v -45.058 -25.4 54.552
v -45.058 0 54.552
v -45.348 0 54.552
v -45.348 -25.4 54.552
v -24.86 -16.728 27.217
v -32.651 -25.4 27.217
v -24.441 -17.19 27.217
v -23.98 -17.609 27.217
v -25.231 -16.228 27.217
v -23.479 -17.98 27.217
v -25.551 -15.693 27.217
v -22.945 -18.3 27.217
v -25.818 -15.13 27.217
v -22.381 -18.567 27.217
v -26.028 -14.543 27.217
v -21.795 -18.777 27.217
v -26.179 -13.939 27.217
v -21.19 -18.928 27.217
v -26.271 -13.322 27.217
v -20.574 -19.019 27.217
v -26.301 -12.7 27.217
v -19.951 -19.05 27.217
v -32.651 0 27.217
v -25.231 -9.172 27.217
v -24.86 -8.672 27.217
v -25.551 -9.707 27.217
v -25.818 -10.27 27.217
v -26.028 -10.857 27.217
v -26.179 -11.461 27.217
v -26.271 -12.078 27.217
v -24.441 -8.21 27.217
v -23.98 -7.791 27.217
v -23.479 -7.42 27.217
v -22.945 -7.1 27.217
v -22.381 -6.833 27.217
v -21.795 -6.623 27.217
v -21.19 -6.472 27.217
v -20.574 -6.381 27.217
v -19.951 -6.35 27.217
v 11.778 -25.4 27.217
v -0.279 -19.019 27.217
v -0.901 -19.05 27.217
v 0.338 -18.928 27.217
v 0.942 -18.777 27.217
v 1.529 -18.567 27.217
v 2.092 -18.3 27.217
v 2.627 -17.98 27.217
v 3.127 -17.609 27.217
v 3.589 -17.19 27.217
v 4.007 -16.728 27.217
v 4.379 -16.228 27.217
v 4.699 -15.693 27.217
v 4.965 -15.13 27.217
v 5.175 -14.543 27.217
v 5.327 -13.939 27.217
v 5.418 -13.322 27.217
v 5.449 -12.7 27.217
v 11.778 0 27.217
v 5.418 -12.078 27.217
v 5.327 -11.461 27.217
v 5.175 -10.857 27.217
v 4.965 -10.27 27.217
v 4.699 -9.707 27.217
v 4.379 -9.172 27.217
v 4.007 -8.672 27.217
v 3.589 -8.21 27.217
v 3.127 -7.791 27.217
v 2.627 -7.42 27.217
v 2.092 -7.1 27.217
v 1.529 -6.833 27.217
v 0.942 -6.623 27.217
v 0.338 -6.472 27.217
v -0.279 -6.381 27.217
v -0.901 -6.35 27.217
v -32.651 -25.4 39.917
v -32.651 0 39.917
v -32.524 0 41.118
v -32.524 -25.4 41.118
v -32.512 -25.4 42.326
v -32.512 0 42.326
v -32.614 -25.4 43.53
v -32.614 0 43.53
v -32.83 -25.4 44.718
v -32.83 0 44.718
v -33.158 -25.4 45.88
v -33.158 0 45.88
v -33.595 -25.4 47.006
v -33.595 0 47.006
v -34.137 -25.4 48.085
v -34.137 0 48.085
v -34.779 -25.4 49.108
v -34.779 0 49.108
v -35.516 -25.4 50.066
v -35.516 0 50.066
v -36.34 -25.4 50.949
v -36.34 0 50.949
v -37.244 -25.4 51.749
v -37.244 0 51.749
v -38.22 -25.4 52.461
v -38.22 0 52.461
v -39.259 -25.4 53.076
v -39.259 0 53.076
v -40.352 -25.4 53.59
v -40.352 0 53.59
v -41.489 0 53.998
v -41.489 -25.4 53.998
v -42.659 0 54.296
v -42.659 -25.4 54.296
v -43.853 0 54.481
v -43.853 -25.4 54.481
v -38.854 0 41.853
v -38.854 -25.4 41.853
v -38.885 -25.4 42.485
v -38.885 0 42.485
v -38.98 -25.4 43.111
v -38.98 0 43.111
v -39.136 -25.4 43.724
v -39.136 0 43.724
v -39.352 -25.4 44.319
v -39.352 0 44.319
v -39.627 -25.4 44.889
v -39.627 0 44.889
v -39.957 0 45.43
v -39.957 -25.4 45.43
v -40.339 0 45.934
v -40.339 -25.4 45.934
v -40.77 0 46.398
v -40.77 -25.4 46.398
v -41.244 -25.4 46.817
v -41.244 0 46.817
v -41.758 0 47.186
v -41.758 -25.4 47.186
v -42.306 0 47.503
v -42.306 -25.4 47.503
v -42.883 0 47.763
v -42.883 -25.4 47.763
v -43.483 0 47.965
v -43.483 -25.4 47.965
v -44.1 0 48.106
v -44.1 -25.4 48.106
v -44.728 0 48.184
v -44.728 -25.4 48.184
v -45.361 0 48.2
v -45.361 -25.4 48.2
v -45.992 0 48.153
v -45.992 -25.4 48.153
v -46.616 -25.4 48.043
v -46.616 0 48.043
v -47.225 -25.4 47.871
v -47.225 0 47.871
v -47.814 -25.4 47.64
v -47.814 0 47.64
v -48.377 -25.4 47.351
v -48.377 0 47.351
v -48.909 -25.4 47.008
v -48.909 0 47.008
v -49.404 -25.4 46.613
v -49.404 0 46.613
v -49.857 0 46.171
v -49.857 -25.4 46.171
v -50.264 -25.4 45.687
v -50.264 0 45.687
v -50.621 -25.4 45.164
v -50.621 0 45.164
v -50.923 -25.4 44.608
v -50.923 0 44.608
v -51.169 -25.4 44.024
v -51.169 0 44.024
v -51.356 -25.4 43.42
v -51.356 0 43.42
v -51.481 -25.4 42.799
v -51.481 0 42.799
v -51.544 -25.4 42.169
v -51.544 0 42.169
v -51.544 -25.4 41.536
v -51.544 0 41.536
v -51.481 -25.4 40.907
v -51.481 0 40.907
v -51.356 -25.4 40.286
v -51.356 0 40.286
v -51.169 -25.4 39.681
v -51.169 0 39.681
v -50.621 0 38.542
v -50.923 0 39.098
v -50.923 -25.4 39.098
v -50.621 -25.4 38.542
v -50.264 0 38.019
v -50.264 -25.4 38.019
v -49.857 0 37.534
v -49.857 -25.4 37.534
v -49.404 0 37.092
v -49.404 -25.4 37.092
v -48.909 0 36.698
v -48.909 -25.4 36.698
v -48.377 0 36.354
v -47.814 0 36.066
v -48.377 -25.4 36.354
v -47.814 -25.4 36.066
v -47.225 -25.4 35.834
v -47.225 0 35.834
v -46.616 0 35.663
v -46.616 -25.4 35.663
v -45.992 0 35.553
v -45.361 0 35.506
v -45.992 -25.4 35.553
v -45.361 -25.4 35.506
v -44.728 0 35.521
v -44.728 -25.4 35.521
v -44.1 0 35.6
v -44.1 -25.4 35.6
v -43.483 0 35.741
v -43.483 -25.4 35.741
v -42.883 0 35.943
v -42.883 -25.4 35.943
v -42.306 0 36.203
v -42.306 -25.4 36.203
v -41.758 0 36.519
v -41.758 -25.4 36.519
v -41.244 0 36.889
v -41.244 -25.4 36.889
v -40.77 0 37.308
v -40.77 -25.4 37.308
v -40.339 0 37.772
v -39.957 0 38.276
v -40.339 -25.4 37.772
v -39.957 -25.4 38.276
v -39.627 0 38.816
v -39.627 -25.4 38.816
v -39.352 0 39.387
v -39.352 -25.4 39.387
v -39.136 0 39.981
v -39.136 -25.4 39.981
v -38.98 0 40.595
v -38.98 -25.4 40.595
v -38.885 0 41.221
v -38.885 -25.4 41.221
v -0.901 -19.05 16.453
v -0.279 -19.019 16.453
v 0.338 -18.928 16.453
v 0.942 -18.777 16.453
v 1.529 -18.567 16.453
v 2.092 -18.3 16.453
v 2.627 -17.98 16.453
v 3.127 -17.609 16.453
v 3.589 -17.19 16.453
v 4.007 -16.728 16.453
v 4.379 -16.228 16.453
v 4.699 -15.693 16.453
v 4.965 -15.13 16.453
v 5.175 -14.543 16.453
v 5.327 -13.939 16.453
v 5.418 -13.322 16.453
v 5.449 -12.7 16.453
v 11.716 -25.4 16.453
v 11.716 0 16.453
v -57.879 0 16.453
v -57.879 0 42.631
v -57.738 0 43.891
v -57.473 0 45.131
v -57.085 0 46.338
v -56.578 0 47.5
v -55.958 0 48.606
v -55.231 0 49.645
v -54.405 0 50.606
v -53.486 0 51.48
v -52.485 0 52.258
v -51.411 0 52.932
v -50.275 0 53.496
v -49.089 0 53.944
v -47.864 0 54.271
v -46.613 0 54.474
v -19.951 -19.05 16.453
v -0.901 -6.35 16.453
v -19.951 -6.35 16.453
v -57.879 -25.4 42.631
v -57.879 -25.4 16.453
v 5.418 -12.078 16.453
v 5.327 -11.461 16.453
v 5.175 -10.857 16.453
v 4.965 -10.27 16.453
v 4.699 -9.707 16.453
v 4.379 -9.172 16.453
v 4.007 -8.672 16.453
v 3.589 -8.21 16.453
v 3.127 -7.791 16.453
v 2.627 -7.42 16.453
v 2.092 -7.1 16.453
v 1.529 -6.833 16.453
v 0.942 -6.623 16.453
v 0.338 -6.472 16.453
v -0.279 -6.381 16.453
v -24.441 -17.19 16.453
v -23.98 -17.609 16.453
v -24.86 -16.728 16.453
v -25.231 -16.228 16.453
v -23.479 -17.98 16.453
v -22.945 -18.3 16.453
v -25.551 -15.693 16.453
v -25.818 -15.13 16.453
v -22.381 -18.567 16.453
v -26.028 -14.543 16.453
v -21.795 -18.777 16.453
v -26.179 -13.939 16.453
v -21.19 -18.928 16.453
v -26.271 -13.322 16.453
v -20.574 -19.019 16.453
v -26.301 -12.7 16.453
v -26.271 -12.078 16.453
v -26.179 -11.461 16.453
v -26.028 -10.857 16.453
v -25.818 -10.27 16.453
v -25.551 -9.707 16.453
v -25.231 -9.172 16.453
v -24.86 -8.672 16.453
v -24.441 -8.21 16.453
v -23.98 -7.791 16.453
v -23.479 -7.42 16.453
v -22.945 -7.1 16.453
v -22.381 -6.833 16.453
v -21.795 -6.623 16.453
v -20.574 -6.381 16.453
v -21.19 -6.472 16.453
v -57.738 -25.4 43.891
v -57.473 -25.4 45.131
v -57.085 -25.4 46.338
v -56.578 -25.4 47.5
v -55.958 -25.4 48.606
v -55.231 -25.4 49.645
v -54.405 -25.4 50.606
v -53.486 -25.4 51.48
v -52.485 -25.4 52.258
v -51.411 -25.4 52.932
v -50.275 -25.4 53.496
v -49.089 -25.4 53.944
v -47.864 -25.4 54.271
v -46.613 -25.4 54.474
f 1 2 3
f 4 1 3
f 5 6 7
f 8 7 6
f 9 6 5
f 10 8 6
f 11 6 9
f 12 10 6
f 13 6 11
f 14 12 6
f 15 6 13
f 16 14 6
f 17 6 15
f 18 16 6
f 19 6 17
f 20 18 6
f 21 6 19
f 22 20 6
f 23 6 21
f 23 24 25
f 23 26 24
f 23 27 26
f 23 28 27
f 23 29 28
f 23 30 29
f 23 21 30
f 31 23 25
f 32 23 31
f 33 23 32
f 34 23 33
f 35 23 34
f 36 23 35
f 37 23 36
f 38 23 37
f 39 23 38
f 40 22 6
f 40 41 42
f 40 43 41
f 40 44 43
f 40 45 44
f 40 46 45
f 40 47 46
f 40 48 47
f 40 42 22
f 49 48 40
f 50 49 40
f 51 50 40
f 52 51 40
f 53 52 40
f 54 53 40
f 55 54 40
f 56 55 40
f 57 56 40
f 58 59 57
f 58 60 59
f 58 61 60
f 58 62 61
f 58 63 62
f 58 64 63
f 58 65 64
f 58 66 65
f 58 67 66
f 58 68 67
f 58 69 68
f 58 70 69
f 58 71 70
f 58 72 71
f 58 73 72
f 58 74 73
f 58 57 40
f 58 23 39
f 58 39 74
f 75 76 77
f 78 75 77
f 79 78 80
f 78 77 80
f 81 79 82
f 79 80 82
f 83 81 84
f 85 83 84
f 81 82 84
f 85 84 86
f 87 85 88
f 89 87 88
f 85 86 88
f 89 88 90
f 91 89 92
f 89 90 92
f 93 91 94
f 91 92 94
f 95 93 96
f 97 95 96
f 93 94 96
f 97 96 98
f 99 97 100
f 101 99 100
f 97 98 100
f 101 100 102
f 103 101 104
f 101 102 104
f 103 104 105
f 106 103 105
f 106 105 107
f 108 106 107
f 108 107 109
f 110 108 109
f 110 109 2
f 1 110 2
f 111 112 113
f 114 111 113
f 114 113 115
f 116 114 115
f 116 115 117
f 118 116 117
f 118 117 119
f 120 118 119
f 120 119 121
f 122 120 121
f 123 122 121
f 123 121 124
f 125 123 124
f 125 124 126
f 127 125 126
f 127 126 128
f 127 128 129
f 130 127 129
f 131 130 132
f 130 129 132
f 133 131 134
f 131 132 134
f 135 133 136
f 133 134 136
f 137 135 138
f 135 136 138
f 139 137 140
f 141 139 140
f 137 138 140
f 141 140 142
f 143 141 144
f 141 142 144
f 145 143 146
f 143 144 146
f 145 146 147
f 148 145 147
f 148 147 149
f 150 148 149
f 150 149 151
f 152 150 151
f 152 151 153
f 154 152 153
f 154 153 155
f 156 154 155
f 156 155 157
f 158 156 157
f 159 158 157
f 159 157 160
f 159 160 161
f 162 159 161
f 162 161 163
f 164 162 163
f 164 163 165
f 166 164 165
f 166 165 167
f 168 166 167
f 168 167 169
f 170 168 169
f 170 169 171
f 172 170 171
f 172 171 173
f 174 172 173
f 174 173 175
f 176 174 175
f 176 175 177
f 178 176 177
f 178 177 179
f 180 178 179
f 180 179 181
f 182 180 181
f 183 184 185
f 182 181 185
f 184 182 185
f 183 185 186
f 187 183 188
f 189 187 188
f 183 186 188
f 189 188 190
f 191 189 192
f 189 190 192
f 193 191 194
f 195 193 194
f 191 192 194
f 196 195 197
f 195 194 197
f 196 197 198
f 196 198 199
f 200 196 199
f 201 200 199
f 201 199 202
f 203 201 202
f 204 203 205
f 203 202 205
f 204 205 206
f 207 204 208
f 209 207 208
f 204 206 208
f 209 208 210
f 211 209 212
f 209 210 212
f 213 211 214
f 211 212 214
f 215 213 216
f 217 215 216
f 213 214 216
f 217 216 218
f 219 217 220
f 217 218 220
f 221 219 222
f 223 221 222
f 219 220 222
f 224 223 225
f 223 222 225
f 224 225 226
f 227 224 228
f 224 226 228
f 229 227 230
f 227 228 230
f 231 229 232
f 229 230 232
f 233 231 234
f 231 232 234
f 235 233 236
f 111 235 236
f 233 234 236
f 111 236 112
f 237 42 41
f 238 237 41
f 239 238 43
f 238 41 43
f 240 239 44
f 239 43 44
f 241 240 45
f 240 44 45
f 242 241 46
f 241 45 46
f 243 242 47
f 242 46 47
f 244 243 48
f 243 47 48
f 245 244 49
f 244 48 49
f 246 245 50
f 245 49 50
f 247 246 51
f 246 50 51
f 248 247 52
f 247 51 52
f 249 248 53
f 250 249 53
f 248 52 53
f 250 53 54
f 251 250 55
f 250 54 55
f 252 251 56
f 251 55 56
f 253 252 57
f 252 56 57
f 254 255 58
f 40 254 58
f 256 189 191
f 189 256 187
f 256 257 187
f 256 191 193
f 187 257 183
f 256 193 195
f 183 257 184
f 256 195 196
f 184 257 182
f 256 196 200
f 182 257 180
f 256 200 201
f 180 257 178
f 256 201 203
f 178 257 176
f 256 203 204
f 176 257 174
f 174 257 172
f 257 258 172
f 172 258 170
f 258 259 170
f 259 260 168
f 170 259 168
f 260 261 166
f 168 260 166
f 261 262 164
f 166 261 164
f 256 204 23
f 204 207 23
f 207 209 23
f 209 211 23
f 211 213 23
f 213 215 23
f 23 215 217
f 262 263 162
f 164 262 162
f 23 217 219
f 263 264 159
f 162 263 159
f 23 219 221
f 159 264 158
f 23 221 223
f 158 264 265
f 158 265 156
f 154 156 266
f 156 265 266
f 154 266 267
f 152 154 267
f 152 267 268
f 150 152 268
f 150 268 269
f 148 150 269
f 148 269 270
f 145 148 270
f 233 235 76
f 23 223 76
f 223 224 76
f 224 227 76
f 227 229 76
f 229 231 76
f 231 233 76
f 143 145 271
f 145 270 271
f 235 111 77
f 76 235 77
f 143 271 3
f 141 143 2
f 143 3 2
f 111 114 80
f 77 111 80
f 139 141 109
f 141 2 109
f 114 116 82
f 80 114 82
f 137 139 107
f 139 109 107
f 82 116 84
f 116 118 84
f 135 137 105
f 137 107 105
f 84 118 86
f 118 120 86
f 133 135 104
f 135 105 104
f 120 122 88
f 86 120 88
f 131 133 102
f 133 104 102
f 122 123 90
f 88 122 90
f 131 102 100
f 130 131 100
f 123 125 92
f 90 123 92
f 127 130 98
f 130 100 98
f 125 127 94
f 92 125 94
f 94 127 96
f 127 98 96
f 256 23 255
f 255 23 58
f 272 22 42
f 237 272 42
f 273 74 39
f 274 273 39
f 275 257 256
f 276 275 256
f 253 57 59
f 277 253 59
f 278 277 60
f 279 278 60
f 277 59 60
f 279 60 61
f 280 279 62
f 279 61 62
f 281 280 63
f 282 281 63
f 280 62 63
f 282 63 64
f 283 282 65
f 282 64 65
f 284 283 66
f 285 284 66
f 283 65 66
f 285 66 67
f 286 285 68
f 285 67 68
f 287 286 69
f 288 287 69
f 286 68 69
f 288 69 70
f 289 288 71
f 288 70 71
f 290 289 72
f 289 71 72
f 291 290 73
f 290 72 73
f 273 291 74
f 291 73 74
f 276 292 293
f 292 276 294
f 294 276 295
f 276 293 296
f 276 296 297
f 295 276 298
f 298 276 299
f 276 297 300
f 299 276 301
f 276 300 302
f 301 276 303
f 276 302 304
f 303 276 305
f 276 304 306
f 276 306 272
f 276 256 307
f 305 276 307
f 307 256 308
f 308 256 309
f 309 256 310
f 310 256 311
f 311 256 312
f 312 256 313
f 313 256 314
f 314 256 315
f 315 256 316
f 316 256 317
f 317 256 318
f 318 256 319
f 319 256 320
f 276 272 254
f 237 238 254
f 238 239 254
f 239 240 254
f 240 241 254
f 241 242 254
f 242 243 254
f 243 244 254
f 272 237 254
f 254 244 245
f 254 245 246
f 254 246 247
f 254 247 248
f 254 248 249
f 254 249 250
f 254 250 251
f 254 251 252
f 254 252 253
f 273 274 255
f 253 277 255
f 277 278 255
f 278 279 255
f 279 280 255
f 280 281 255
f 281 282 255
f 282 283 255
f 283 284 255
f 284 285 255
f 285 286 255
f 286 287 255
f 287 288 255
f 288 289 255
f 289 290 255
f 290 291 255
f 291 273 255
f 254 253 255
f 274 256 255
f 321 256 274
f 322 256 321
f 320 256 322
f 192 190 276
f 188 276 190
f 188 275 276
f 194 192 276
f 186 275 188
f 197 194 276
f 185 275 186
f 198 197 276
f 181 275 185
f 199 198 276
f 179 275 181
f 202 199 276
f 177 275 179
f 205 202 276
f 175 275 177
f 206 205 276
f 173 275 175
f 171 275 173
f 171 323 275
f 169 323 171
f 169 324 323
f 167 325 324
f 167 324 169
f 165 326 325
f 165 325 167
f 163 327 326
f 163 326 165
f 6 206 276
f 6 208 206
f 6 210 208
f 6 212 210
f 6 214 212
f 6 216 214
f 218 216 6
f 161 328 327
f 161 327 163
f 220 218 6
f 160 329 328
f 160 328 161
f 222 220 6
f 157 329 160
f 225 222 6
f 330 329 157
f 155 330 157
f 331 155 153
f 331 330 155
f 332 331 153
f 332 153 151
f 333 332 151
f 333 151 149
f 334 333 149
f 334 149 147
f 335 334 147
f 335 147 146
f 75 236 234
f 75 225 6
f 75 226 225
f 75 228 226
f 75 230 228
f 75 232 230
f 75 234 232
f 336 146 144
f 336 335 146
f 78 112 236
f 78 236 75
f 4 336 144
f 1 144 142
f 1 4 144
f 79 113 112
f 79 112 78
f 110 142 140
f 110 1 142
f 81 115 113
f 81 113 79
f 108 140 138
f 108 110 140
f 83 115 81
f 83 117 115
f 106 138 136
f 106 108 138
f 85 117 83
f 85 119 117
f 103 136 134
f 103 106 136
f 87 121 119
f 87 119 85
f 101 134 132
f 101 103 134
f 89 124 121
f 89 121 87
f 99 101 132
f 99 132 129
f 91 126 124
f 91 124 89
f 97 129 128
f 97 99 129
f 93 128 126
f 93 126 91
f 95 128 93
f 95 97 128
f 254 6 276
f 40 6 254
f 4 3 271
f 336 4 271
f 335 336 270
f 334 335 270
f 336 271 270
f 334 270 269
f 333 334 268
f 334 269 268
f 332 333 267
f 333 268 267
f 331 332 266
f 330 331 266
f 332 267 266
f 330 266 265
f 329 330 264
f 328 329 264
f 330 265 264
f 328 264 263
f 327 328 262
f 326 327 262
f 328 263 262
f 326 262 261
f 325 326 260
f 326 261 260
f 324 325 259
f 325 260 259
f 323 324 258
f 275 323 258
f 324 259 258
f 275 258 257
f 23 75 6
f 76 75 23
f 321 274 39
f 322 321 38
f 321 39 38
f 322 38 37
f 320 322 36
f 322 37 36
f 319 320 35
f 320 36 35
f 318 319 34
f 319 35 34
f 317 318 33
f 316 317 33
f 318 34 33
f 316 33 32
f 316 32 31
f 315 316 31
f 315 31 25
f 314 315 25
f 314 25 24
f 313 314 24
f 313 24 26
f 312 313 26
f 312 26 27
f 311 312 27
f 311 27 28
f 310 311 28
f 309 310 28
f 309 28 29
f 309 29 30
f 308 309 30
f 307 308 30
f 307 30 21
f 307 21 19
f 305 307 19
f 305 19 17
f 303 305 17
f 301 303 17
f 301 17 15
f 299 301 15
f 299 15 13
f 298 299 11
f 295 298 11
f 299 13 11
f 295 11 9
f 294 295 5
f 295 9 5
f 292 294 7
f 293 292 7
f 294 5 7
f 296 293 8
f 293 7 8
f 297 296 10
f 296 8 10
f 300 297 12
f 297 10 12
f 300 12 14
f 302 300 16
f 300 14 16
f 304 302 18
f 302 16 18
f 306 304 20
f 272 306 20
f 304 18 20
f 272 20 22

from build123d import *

# Parameters (mm, degrees)
F2_DEPTH = 25.4
F3_R     = 6.349176
F4_DEPTH = 25.401
F6_DEPTH = 23.465528
F7_W     = 44.45
F7_H     = 25.4
F8_DEPTH = 12.7


with BuildPart() as f2:
    # F1 (on face) → F2 (new body)
    with BuildSketch(Plane.XZ):
        with BuildLine():
            Line((11.798794, 39.917438), (-32.651206, 39.917438))
            ThreePointArc((-32.651206, 39.917438), (-35.515616, 50.065544), (-45.058145, 54.552085))
            Line((-45.058145, 54.552085), (-45.347569, 54.552085))
            ThreePointArc((-45.347569, 54.552085), (-53.956125, 51.054556), (-57.87898, 42.631305))
            Line((-57.87898, 42.631305), (-57.87898, 16.452909))
            Line((-57.87898, 16.452909), (11.716359, 16.452909))
            Line((11.716359, 16.452909), (11.798794, 30.775242))
            Line((11.798794, 30.775242), (11.798794, 39.917438))
        make_face()
    extrude(amount=F2_DEPTH)

    # F3 (on face) → F4 (cut, through all)
    with BuildSketch(Plane.XZ.offset(25.4)):
        with Locations((-45.202857, 41.852909)):
            Circle(F3_R)
    extrude(amount=-F4_DEPTH, mode=Mode.SUBTRACT)

    # F5 (on face) → F6 (cut, through all)
    with BuildSketch(Plane.XY.offset(39.917438)):
        with BuildLine():
            Line((-19.951206, -12.7), (-19.951206, -6.35))
            ThreePointArc((-19.951206, -6.35), (-26.301206, -12.7), (-19.951206, -19.05))
            Line((-19.951206, -19.05), (-19.951206, -12.7))
        make_face()
        with BuildLine():
            ThreePointArc((-13.601206, -12.7), (-15.461078, -8.209872), (-19.951206, -6.35))
            Line((-19.951206, -6.35), (-19.951206, -12.7))
            Line((-19.951206, -12.7), (-19.951206, -19.05))
            ThreePointArc((-19.951206, -19.05), (-15.461078, -17.190128), (-13.601206, -12.7))
        make_face()
        with BuildLine():
            ThreePointArc((-0.901206, -19.05), (-7.251206, -12.7), (-0.901206, -6.35))
            Line((-0.901206, -6.35), (-19.951206, -6.35))
            ThreePointArc((-19.951206, -6.35), (-15.461078, -8.209872), (-13.601206, -12.7))
            ThreePointArc((-13.601206, -12.7), (-15.461078, -17.190128), (-19.951206, -19.05))
            Line((-19.951206, -19.05), (-0.901206, -19.05))
        make_face()
        with BuildLine():
            ThreePointArc((-0.901206, -19.05), (3.588922, -17.190128), (5.448794, -12.7))
            ThreePointArc((5.448794, -12.7), (3.588922, -8.209872), (-0.901206, -6.35))
            ThreePointArc((-0.901206, -6.35), (-7.251206, -12.7), (-0.901206, -19.05))
        make_face()
    extrude(amount=-F6_DEPTH, mode=Mode.SUBTRACT)

    # F7 (on face) → F8 (cut)
    with BuildSketch(Plane.XY.offset(39.917438)):
        with Locations((-10.426206, -12.7)):
            Rectangle(F7_W, F7_H)
    extrude(amount=-F8_DEPTH, mode=Mode.SUBTRACT)


solid = f2.part
